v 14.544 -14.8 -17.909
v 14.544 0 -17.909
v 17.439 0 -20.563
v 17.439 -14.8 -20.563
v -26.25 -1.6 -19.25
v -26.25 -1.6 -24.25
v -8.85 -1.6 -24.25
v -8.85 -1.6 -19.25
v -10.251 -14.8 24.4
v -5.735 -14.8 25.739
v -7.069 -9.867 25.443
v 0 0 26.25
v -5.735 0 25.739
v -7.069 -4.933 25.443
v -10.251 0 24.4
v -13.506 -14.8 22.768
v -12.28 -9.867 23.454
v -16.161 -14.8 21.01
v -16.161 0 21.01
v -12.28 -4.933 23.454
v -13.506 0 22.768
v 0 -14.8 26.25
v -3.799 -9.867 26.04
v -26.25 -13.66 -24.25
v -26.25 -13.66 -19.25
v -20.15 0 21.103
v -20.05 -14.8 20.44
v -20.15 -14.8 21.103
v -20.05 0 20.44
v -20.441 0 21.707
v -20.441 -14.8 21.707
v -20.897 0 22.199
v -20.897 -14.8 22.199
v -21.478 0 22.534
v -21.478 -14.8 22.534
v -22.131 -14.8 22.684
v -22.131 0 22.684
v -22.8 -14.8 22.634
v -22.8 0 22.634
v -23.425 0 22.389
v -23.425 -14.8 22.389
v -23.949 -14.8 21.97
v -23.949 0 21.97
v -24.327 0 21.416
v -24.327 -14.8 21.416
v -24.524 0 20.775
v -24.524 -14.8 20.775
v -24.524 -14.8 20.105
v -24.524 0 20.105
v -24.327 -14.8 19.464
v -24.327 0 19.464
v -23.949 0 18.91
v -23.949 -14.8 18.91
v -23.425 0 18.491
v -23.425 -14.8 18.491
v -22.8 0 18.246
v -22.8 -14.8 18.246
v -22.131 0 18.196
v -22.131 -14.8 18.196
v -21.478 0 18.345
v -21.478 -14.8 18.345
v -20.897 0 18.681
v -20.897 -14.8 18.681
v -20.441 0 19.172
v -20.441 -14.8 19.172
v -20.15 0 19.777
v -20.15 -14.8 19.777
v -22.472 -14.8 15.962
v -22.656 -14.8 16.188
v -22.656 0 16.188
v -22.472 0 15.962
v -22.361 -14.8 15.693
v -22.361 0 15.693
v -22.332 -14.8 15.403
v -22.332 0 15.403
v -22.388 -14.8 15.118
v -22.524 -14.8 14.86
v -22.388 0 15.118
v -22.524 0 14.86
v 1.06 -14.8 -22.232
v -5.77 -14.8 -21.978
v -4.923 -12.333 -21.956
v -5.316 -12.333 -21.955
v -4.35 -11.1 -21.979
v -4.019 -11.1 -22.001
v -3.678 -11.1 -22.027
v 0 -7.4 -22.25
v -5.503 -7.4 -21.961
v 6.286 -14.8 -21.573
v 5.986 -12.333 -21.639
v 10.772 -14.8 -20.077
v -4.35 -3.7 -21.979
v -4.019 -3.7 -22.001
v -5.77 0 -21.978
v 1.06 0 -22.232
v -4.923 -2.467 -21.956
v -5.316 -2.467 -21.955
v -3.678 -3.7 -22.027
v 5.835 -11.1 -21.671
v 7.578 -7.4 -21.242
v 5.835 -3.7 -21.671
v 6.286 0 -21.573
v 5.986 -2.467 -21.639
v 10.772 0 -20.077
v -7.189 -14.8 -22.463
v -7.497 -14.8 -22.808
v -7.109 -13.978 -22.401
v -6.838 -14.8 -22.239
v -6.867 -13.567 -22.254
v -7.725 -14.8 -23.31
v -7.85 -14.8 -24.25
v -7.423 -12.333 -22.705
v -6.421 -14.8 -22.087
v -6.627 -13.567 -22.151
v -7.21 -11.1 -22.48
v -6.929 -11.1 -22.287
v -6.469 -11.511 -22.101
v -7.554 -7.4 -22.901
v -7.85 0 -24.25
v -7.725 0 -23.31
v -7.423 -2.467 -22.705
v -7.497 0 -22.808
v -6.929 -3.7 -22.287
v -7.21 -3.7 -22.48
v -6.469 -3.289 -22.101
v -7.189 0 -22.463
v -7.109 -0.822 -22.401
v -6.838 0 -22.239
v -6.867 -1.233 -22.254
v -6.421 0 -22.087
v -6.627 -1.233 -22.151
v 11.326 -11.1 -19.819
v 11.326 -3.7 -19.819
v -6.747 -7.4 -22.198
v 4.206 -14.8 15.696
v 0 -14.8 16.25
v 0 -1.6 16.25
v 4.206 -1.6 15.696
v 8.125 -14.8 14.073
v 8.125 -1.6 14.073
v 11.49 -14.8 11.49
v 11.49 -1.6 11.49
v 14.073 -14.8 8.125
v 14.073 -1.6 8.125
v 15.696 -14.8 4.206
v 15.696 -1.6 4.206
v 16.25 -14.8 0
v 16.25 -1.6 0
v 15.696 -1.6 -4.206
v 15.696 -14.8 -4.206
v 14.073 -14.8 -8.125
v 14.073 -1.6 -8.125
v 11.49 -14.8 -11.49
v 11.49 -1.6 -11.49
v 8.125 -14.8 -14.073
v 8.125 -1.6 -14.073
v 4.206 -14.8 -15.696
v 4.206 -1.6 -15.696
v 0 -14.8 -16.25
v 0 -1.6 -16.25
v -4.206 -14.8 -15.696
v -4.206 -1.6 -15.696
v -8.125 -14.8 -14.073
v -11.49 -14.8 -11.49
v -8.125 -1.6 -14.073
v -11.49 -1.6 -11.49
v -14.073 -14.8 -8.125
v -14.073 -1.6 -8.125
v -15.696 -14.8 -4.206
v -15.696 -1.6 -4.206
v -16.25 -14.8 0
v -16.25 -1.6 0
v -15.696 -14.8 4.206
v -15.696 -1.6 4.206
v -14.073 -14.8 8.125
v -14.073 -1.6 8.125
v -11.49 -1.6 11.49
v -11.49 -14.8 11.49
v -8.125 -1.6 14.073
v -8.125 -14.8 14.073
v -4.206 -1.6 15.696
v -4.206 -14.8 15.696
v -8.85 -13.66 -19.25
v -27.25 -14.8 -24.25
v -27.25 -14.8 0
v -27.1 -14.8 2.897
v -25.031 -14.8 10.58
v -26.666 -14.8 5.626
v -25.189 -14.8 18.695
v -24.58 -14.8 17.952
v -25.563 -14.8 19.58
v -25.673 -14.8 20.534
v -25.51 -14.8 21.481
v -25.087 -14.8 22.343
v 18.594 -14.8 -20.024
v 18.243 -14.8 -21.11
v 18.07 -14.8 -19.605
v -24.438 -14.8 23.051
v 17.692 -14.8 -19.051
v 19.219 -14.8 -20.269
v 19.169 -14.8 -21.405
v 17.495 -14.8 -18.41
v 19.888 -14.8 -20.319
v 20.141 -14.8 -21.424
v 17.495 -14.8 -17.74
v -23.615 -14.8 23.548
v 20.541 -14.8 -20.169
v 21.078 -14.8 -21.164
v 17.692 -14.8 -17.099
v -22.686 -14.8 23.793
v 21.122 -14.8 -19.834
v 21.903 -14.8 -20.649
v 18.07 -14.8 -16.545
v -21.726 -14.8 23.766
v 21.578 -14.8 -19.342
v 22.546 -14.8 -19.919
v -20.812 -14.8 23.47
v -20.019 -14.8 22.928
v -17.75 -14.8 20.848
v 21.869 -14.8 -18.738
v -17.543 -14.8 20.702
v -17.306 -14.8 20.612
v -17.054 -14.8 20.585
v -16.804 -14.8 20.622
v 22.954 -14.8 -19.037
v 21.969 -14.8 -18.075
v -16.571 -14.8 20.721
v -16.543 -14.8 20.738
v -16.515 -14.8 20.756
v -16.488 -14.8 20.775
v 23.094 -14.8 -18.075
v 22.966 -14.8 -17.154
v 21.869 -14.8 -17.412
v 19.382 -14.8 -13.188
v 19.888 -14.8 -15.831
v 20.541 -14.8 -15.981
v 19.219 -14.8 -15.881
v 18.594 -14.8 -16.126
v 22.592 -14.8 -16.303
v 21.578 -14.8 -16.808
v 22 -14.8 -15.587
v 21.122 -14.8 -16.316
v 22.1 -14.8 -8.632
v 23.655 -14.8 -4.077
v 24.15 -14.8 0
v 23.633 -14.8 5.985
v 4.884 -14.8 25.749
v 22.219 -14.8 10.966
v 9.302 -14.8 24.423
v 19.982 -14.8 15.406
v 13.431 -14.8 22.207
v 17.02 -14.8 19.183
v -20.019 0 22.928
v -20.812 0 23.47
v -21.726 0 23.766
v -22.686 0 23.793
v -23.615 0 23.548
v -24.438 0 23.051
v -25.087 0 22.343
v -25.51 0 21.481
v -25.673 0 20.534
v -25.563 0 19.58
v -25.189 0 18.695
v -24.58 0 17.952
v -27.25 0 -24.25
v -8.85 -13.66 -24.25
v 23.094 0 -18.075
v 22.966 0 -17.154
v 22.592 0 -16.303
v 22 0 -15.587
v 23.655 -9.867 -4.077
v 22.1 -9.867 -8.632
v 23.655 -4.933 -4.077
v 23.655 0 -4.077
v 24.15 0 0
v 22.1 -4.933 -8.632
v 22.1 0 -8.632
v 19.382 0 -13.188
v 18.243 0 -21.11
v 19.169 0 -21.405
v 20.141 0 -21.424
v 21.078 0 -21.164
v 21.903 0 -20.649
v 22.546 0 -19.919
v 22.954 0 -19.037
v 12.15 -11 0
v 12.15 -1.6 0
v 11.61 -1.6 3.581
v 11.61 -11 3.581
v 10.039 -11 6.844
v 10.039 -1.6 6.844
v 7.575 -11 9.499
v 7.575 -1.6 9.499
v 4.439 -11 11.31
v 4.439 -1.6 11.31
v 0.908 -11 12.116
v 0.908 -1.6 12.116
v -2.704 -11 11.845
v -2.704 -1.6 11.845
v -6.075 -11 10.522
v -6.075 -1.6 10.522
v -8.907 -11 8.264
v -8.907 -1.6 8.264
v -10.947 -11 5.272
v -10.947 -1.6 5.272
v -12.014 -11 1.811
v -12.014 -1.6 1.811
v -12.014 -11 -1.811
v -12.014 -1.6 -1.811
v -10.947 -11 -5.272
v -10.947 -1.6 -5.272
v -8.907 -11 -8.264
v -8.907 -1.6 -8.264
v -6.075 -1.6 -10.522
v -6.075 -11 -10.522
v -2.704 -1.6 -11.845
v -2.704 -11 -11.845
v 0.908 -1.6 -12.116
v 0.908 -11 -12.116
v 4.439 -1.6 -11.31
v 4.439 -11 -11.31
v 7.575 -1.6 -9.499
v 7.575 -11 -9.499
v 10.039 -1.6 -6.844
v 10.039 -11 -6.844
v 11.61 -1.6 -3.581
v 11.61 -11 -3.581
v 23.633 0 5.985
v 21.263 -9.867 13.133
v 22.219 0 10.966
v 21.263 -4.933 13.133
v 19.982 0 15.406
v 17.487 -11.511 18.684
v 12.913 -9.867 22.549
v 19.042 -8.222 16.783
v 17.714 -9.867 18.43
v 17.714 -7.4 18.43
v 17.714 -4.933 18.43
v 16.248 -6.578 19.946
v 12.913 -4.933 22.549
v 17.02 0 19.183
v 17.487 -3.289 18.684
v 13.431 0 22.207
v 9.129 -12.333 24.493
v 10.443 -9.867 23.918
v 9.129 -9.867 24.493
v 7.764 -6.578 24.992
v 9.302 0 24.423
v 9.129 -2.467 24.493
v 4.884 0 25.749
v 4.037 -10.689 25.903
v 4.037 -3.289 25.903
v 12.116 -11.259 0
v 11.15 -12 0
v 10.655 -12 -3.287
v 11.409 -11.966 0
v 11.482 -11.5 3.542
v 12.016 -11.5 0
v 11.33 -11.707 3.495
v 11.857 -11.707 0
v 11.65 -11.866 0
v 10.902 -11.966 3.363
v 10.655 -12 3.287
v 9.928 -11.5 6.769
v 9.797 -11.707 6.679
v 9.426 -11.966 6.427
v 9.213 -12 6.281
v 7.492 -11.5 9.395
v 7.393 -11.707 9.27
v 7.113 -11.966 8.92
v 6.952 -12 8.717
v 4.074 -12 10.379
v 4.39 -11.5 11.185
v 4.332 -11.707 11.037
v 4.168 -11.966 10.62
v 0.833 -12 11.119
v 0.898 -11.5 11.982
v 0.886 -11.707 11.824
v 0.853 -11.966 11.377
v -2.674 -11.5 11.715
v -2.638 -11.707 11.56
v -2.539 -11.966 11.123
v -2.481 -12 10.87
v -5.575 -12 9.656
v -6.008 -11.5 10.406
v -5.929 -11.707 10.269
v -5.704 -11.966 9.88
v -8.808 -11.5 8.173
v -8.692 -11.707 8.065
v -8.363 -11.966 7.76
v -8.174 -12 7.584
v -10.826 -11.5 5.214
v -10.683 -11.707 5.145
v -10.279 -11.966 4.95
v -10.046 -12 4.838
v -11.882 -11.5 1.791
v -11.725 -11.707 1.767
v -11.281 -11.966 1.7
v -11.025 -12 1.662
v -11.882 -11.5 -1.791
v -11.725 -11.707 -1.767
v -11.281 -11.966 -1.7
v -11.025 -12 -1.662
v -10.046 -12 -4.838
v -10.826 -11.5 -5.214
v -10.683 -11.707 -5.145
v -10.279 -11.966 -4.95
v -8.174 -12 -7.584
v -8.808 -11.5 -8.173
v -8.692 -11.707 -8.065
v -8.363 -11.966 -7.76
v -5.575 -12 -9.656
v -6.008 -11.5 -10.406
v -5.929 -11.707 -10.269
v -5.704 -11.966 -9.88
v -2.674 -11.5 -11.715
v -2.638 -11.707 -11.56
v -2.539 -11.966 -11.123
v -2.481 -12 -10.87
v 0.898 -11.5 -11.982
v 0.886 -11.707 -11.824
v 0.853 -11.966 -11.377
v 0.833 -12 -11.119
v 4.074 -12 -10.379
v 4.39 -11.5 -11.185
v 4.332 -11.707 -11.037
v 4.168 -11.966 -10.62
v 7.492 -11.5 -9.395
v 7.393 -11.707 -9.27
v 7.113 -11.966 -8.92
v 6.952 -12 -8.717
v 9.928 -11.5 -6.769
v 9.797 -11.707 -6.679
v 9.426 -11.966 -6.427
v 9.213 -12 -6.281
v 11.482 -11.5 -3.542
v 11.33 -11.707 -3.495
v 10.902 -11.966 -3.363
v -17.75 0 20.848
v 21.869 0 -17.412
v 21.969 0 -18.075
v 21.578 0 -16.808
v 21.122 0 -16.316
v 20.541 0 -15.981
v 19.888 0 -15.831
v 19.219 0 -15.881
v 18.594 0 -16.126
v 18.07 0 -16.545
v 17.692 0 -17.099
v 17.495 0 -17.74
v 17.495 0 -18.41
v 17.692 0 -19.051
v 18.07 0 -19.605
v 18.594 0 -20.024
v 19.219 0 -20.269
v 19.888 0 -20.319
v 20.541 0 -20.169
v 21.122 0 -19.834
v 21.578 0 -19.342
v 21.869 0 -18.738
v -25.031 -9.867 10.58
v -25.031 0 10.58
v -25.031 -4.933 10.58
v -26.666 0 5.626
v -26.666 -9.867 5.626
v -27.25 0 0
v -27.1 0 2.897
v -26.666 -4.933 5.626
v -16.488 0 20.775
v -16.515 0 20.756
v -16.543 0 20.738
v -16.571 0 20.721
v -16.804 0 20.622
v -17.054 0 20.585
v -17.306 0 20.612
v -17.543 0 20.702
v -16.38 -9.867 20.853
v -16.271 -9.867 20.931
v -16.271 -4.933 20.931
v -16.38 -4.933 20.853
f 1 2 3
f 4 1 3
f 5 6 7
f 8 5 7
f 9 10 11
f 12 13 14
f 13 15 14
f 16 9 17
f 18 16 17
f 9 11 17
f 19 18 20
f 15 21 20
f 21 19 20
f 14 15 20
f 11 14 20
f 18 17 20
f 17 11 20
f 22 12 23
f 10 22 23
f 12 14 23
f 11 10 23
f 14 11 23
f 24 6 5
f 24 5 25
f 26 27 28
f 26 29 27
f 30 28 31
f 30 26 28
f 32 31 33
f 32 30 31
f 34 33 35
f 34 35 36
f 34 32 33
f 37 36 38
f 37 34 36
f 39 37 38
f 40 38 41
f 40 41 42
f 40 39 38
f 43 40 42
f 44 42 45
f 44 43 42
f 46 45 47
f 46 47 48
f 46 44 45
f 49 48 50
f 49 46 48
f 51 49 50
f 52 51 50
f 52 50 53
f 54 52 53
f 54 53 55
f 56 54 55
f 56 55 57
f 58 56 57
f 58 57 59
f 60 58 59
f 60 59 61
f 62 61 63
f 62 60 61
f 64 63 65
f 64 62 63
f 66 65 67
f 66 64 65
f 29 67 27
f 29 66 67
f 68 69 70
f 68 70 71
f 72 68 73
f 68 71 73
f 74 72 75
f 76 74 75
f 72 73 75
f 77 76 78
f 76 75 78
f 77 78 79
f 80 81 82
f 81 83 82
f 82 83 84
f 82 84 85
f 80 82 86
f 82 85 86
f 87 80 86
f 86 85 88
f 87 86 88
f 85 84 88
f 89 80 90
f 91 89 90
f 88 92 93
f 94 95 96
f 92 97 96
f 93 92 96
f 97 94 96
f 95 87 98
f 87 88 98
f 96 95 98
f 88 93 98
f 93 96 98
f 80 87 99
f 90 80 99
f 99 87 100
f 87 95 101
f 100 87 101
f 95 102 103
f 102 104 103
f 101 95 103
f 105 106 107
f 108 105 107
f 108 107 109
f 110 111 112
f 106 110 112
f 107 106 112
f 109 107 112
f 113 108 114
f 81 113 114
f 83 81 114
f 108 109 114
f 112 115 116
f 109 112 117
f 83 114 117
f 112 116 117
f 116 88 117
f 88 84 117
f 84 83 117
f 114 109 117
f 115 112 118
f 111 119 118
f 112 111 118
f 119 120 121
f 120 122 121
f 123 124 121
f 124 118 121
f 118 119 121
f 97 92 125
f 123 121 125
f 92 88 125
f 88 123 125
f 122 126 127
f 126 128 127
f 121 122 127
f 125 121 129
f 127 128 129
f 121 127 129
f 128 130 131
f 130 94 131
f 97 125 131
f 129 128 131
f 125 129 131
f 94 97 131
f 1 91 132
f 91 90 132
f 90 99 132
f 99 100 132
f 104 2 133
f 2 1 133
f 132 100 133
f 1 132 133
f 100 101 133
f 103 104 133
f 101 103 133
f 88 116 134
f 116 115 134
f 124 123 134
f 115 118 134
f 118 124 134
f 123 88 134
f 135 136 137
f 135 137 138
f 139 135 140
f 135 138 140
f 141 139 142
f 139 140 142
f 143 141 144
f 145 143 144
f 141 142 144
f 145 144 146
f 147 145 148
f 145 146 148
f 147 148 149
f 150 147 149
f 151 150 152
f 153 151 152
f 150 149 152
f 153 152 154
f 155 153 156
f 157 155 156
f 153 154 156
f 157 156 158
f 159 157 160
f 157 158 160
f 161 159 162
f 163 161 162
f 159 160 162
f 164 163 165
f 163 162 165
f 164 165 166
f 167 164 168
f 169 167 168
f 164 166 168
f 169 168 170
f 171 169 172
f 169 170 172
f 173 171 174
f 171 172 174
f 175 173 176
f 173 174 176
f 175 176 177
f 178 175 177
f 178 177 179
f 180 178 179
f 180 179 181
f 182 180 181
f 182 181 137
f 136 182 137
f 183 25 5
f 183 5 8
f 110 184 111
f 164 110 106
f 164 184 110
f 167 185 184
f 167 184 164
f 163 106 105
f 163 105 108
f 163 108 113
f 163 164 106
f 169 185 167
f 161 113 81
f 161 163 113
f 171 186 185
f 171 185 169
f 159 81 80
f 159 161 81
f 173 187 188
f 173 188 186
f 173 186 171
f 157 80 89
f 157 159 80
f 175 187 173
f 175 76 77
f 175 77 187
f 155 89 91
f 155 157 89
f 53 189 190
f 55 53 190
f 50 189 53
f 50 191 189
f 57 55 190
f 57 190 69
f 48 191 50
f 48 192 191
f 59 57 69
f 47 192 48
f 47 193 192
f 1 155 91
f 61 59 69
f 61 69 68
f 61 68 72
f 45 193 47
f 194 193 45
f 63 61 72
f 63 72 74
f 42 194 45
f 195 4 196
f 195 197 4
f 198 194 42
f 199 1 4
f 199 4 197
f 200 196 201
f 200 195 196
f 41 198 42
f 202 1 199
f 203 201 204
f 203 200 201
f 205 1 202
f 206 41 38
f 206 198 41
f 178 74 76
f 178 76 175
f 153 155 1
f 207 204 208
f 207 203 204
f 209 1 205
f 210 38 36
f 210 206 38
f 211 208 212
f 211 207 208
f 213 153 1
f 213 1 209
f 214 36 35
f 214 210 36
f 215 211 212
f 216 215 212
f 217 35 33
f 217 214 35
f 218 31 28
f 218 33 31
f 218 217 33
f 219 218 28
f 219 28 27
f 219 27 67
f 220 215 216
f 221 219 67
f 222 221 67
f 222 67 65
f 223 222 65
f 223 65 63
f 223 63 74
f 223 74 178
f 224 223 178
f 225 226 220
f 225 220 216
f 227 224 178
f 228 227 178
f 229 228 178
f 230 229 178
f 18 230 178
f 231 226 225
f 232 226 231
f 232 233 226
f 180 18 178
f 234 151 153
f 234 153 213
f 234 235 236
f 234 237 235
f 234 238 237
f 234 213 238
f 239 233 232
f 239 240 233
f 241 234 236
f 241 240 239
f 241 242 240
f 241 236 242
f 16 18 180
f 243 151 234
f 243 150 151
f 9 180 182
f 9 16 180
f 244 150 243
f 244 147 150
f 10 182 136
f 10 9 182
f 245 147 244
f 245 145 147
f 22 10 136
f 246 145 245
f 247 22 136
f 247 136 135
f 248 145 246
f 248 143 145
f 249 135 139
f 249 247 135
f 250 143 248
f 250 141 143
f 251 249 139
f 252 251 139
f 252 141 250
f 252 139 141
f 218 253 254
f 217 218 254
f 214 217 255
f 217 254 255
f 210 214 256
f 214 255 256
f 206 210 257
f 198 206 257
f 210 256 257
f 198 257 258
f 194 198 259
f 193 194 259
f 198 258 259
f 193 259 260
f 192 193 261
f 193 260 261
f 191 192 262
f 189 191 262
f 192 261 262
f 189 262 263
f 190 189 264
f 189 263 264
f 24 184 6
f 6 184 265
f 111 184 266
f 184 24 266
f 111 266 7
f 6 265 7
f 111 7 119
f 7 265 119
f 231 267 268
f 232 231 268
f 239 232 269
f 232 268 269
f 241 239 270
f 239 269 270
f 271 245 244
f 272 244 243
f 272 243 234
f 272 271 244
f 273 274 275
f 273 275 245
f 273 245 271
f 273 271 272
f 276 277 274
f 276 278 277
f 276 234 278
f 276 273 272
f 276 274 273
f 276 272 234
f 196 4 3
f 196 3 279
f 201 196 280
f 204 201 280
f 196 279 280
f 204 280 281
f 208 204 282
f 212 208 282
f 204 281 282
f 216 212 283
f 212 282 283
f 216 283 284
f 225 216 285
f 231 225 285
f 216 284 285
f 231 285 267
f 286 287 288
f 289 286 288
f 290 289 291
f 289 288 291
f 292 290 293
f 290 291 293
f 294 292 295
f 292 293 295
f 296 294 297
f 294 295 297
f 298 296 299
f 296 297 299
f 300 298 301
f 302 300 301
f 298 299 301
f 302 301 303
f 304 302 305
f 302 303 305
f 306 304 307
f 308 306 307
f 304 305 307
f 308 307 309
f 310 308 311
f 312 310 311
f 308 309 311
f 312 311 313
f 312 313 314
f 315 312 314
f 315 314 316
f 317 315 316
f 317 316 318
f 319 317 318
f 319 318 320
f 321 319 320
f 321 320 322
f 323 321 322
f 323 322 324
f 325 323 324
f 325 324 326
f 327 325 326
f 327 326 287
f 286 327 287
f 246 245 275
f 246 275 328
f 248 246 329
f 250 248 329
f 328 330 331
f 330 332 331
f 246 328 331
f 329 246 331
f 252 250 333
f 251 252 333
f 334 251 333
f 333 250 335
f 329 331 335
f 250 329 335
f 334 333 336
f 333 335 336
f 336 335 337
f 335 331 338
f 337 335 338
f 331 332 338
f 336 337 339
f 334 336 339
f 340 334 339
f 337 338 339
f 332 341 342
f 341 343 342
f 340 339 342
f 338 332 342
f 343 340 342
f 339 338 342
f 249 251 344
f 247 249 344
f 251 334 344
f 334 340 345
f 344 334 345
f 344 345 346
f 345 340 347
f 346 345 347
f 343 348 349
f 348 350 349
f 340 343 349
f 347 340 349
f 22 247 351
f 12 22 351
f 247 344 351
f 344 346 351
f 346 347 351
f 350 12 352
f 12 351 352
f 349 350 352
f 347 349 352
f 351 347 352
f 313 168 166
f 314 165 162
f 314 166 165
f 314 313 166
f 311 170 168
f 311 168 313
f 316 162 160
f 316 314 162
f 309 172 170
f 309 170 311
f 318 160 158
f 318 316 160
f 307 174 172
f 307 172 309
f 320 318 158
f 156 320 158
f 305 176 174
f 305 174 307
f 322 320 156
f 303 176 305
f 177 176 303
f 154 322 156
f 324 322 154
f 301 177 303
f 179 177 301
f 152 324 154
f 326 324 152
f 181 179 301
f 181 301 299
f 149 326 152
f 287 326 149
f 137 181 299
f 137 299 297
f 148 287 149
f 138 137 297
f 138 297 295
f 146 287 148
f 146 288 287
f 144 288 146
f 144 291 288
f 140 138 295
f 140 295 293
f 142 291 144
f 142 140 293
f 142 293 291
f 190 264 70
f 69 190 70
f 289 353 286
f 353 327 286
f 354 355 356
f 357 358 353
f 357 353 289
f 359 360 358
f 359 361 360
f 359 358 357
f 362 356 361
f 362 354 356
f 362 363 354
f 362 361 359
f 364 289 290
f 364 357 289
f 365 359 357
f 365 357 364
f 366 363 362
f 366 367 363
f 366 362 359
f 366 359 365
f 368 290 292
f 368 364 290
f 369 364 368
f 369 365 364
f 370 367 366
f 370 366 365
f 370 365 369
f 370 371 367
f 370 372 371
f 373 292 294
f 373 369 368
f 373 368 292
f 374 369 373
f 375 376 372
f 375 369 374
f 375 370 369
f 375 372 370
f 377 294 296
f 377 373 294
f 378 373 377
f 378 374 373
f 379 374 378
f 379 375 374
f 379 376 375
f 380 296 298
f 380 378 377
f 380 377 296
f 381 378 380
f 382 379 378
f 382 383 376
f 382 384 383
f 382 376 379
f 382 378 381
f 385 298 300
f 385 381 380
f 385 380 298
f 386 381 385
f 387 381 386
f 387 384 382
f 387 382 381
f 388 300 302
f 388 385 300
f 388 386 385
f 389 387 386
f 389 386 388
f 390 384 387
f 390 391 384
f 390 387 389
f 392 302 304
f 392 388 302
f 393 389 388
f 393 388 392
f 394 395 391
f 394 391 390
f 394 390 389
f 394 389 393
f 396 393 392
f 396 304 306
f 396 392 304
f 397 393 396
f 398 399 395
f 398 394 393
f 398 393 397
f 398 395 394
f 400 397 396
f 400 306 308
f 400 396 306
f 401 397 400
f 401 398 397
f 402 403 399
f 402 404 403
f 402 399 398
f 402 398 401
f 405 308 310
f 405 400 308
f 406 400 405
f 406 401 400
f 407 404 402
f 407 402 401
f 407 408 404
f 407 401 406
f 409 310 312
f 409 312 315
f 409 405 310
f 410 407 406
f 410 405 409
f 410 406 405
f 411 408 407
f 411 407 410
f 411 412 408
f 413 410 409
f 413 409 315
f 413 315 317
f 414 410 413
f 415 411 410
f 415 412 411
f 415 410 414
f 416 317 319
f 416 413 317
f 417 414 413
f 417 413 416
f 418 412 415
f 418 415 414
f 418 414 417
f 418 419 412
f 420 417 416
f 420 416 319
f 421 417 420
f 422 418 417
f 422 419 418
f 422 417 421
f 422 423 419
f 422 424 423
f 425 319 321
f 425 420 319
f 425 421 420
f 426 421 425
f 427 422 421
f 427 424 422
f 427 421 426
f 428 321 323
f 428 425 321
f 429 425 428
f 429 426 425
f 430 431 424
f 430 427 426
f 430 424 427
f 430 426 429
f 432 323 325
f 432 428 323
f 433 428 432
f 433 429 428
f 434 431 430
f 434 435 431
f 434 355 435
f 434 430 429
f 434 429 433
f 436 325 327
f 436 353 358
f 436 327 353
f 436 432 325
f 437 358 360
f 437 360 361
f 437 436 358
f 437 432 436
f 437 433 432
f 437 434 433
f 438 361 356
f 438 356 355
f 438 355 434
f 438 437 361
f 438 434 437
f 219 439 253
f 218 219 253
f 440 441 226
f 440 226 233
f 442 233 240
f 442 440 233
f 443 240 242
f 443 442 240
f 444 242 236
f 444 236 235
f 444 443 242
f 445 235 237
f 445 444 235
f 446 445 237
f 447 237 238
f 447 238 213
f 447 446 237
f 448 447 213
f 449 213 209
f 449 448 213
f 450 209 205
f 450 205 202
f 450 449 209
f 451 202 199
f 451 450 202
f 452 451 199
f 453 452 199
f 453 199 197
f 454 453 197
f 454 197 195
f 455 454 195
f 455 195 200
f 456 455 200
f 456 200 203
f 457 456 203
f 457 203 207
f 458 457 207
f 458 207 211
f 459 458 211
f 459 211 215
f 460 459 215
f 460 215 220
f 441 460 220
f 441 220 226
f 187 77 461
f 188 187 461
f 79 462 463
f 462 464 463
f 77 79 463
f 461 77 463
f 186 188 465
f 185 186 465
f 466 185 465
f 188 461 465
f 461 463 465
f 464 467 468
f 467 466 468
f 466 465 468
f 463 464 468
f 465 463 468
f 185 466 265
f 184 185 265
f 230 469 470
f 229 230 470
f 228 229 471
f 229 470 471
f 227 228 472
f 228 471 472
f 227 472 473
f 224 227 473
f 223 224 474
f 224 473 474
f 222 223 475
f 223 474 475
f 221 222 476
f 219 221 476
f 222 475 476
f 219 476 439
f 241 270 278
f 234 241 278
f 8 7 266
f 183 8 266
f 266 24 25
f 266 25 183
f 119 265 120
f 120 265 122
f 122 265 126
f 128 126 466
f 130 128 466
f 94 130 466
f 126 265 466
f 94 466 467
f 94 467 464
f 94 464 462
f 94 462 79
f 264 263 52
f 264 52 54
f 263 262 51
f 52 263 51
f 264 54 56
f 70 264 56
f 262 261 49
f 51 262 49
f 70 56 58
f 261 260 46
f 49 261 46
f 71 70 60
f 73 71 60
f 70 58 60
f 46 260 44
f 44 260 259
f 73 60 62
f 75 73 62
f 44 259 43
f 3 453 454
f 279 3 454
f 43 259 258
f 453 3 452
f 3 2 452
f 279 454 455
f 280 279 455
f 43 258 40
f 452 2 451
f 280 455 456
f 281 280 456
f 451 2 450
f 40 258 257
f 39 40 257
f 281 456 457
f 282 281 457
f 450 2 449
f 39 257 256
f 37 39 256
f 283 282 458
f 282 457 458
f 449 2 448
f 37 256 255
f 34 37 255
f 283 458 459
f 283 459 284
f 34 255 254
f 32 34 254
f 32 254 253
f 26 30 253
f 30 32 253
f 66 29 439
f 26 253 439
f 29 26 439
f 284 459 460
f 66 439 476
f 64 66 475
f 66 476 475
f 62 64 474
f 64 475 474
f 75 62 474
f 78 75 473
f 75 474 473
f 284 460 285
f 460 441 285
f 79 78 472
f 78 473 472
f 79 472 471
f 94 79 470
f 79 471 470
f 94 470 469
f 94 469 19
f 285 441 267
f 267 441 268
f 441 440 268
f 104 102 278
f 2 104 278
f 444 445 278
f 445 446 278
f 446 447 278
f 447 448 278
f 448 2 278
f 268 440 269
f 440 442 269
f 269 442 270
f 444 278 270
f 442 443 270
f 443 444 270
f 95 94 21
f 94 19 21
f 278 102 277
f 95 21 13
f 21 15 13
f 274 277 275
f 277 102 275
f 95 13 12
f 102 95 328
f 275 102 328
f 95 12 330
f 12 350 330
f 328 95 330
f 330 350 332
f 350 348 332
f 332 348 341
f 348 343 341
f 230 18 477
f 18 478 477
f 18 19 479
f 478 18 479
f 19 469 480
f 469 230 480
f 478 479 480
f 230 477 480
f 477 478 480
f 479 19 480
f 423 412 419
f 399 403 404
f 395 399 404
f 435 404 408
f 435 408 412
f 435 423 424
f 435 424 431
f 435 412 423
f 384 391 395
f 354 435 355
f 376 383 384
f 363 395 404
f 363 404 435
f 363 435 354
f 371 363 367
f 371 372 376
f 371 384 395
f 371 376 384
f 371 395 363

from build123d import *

# Parameters (mm, degrees)
F0_R     = 2.25
F1_DEPTH = 14.8
F0_R_2   = 12.15
F2_DEPTH = 1.6
F3_DEPTH = 12
F4_R     = 1
F5_W     = 17.4
F5_H     = 12.06
F6_DEPTH = 5


with BuildPart() as f1:
    # F0 (on Front) → F1 (new body)
    with BuildSketch(Plane.XZ):
        with BuildLine():
            Line((-27.25, 0), (-27.25, -24.25))
            Line((-27.25, -24.25), (-7.85, -24.25))
            add(Edge.make_bspline(
                [(-7.85, -24.25), (-7.8176427633, -20.8169110119), (-4.3375464156, -22.25), (0, -22.25)],
                knots=[0, 0, 0, 0, 8.1007715682, 8.1007715682, 8.1007715682, 8.1007715682], degree=3))
            add(Edge.make_bspline(
                [(14.5437740109, -17.909216005), (10.9068056005, -20.5097986935), (6.122203429, -22.25), (0, -22.25)],
                knots=[21.4185998801, 21.4185998801, 21.4185998801, 21.4185998801, 32.8372501894, 32.8372501894, 32.8372501894, 32.8372501894], degree=3))
            add(Edge.make_bspline(
                [(19.3821703567, -13.1875596661), (18.0720576154, -14.9154903789), (16.4686462302, -16.5328528348), (14.5437740109, -17.909216005)],
                knots=[15.3752582058, 15.3752582058, 15.3752582058, 15.3752582058, 21.4185998801, 21.4185998801, 21.4185998801, 21.4185998801], degree=3))
            add(Edge.make_bspline(
                [(24.15, 0), (24.15, -3.6795945823), (22.7153133033, -8.7914188713), (19.3821703567, -13.1875596661)],
                knots=[0, 0, 0, 0, 15.3752582058, 15.3752582058, 15.3752582058, 15.3752582058], degree=3))
            add(Edge.make_bspline(
                [(24.15, 0), (24.2929216474, 14.3250608817), (14.8955499753, 26.0717794299), (0, 26.25)],
                knots=[0, 0, 0, 0, 35.6691042781, 35.6691042781, 35.6691042781, 35.6691042781], degree=3))
            add(Edge.make_bspline(
                [(0, 26.25), (-5.135877891, 26.2629323961), (-11.114542158, 24.5071482084), (-16.161044046, 21.0100500089)],
                knots=[0, 0, 0, 0, 16.8847295513, 16.8847295513, 16.8847295513, 16.8847295513], degree=3))
            add(Edge.make_bspline(
                [(-16.161044046, 21.0100500089), (-16.2712231538, 20.9311478534), (-16.3801314978, 20.8526765927), (-16.487850408, 20.7747483814)],
                knots=[16.497992714, 16.497992714, 16.497992714, 16.497992714, 17.0339105302, 17.0339105302, 17.0339105302, 17.0339105302], degree=3))
            add(Edge.make_bspline(
                [(-16.487850408, 20.7747483814), (-16.7124834128, 20.6122397909), (-16.9319438817, 20.4520927797), (-17.1469693705, 20.2953244431)],
                knots=[17.0339105302, 17.0339105302, 17.0339105302, 17.0339105302, 18.1514935909, 18.1514935909, 18.1514935909, 18.1514935909], degree=3))
            add(Edge.make_bspline(
                [(-17.1469693705, 20.2953244431), (-19.1547308604, 18.7732329399), (-20.9874640515, 16.9609662016), (-22.5242380569, 14.8603912213)],
                knots=[17.9984458903, 17.9984458903, 17.9984458903, 17.9984458903, 24.8946681266, 24.8946681266, 24.8946681266, 24.8946681266], degree=3))
            add(Edge.make_bspline(
                [(-22.5242380569, 14.8603912213), (-25.4083045723, 10.9182384112), (-27.25, 5.9606612107), (-27.25, 0)],
                knots=[24.8946681266, 24.8946681266, 24.8946681266, 24.8946681266, 37.836820691, 37.836820691, 37.836820691, 37.836820691], degree=3))
        make_face()
        with BuildLine():
            ThreePointArc((16.25, 0), (-11.4904851943, -11.4904851943), (0, 16.25))
            ThreePointArc((0, 16.25), (11.4904851943, 11.4904851943), (16.25, 0))
        make_face(mode=Mode.SUBTRACT)
        with BuildLine():
            ThreePointArc((-22.6556099396, 16.1880189983), (-22.3361709954, 15.5493145647), (-22.5242380569, 14.8603912213))
            add(Edge.make_bspline(
                [(-17.1469693705, 20.2953244431), (-19.1547308604, 18.7732329399), (-20.9874640515, 16.9609662016), (-22.5242380569, 14.8603912213)],
                knots=[17.9984458903, 17.9984458903, 17.9984458903, 17.9984458903, 24.8946681266, 24.8946681266, 24.8946681266, 24.8946681266], degree=3))
            add(Edge.make_bspline(
                [(-16.5707430692, 20.7208158925), (-16.7643258601, 20.5815997135), (-16.9564357443, 20.4397686985), (-17.1469693705, 20.2953244431)],
                knots=[17.3440044956, 17.3440044956, 17.3440044956, 17.3440044956, 17.9984458903, 17.9984458903, 17.9984458903, 17.9984458903], degree=3))
            ThreePointArc((-16.5707430692, 20.7208158925), (-17.1810656026, 20.5907080667), (-17.7496903525, 20.8477830266))
            Line((-17.7496903525, 20.8477830266), (-20.0190790788, 22.927921795))
            ThreePointArc((-20.0190790788, 22.927921795), (-19.2102914227, 21.7989913577), (-18.924569733, 20.439953271))
            ThreePointArc((-18.924569733, 20.439953271), (-20.9405316464, 17.3506749607), (-24.5800603872, 17.9519847471))
            Line((-24.5800603872, 17.9519847471), (-22.6556099396, 16.1880189983))
        make_face()
        with BuildLine():
            add(Edge.make_bspline(
                [(19.3821703567, -13.1875596661), (18.0720576154, -14.9154903789), (16.4686462302, -16.5328528348), (14.5437740109, -17.909216005)],
                knots=[15.3752582058, 15.3752582058, 15.3752582058, 15.3752582058, 21.4185998801, 21.4185998801, 21.4185998801, 21.4185998801], degree=3))
            Line((14.5437740109, -17.909216005), (17.4389635725, -20.5629685239))
            ThreePointArc((17.4389635725, -20.5629685239), (17.2314857028, -15.7945093458), (21.9999448809, -15.5870314761))
            Line((21.9999448809, -15.5870314761), (19.3821703567, -13.1875596661))
        make_face()
        with BuildLine():
            add(Edge.make_bspline(
                [(-16.5707430692, 20.7208158925), (-16.7643258601, 20.5815997135), (-16.9564357443, 20.4397686985), (-17.1469693705, 20.2953244431)],
                knots=[17.3440044956, 17.3440044956, 17.3440044956, 17.3440044956, 17.9984458903, 17.9984458903, 17.9984458903, 17.9984458903], degree=3))
            add(Edge.make_bspline(
                [(-16.487850408, 20.7747483814), (-16.7124834128, 20.6122397909), (-16.9319438817, 20.4520927797), (-17.1469693705, 20.2953244431)],
                knots=[17.0339105302, 17.0339105302, 17.0339105302, 17.0339105302, 18.1514935909, 18.1514935909, 18.1514935909, 18.1514935909], degree=3))
            ThreePointArc((-16.487850408, 20.7747483814), (-16.5286296346, 20.7467568176), (-16.5707430692, 20.7208158925))
        make_face()
        with BuildLine():
            ThreePointArc((21.9999448809, -15.5870314761), (17.2314857028, -15.7945093458), (17.4389635725, -20.5629685239))
            ThreePointArc((17.4389635725, -20.5629685239), (21.0784923134, -21.1642783104), (23.0944542267, -18.075))
            ThreePointArc((23.0944542267, -18.075), (22.8087325371, -16.7159619133), (21.9999448809, -15.5870314761))
        make_face()
        with Locations((19.7194542267, -18.075)):
            Circle(F0_R, mode=Mode.SUBTRACT)
        with BuildLine():
            ThreePointArc((-20.0190790788, 22.927921795), (-24.787538257, 22.7204439252), (-24.5800603872, 17.9519847471))
            ThreePointArc((-24.5800603872, 17.9519847471), (-20.9405316464, 17.3506749607), (-18.924569733, 20.439953271))
            ThreePointArc((-18.924569733, 20.439953271), (-19.2102914227, 21.7989913577), (-20.0190790788, 22.927921795))
        make_face()
        with Locations((-22.299569733, 20.439953271)):
            Circle(F0_R, mode=Mode.SUBTRACT)
        with BuildLine():
            add(Edge.make_bspline(
                [(0, 26.25), (-8.1731251983, 26.2763401513), (-12.7692289915, 23.4390179358), (-16.161044046, 21.0100500089)],
                knots=[0, 0, 0, 0, 16.497992714, 16.497992714, 16.497992714, 16.497992714], degree=3))
            add(Edge.make_bspline(
                [(0, 26.25), (-5.135877891, 26.2629323961), (-11.114542158, 24.5071482084), (-16.161044046, 21.0100500089)],
                knots=[0, 0, 0, 0, 16.8847295513, 16.8847295513, 16.8847295513, 16.8847295513], degree=3))
        make_face()
    extrude(amount=F1_DEPTH)

    # F0 (on Front) → F2 (join)
    with BuildSketch(Plane.XZ):
        with BuildLine():
            Line((-27.25, 0), (-27.25, -24.25))
            Line((-27.25, -24.25), (-7.85, -24.25))
            add(Edge.make_bspline(
                [(-7.85, -24.25), (-7.8176427633, -20.8169110119), (-4.3375464156, -22.25), (0, -22.25)],
                knots=[0, 0, 0, 0, 8.1007715682, 8.1007715682, 8.1007715682, 8.1007715682], degree=3))
            add(Edge.make_bspline(
                [(14.5437740109, -17.909216005), (10.9068056005, -20.5097986935), (6.122203429, -22.25), (0, -22.25)],
                knots=[21.4185998801, 21.4185998801, 21.4185998801, 21.4185998801, 32.8372501894, 32.8372501894, 32.8372501894, 32.8372501894], degree=3))
            add(Edge.make_bspline(
                [(19.3821703567, -13.1875596661), (18.0720576154, -14.9154903789), (16.4686462302, -16.5328528348), (14.5437740109, -17.909216005)],
                knots=[15.3752582058, 15.3752582058, 15.3752582058, 15.3752582058, 21.4185998801, 21.4185998801, 21.4185998801, 21.4185998801], degree=3))
            add(Edge.make_bspline(
                [(24.15, 0), (24.15, -3.6795945823), (22.7153133033, -8.7914188713), (19.3821703567, -13.1875596661)],
                knots=[0, 0, 0, 0, 15.3752582058, 15.3752582058, 15.3752582058, 15.3752582058], degree=3))
            add(Edge.make_bspline(
                [(24.15, 0), (24.2929216474, 14.3250608817), (14.8955499753, 26.0717794299), (0, 26.25)],
                knots=[0, 0, 0, 0, 35.6691042781, 35.6691042781, 35.6691042781, 35.6691042781], degree=3))
            add(Edge.make_bspline(
                [(0, 26.25), (-5.135877891, 26.2629323961), (-11.114542158, 24.5071482084), (-16.161044046, 21.0100500089)],
                knots=[0, 0, 0, 0, 16.8847295513, 16.8847295513, 16.8847295513, 16.8847295513], degree=3))
            add(Edge.make_bspline(
                [(-16.161044046, 21.0100500089), (-16.2712231538, 20.9311478534), (-16.3801314978, 20.8526765927), (-16.487850408, 20.7747483814)],
                knots=[16.497992714, 16.497992714, 16.497992714, 16.497992714, 17.0339105302, 17.0339105302, 17.0339105302, 17.0339105302], degree=3))
            add(Edge.make_bspline(
                [(-16.487850408, 20.7747483814), (-16.7124834128, 20.6122397909), (-16.9319438817, 20.4520927797), (-17.1469693705, 20.2953244431)],
                knots=[17.0339105302, 17.0339105302, 17.0339105302, 17.0339105302, 18.1514935909, 18.1514935909, 18.1514935909, 18.1514935909], degree=3))
            add(Edge.make_bspline(
                [(-17.1469693705, 20.2953244431), (-19.1547308604, 18.7732329399), (-20.9874640515, 16.9609662016), (-22.5242380569, 14.8603912213)],
                knots=[17.9984458903, 17.9984458903, 17.9984458903, 17.9984458903, 24.8946681266, 24.8946681266, 24.8946681266, 24.8946681266], degree=3))
            add(Edge.make_bspline(
                [(-22.5242380569, 14.8603912213), (-25.4083045723, 10.9182384112), (-27.25, 5.9606612107), (-27.25, 0)],
                knots=[24.8946681266, 24.8946681266, 24.8946681266, 24.8946681266, 37.836820691, 37.836820691, 37.836820691, 37.836820691], degree=3))
        make_face()
        with BuildLine():
            ThreePointArc((16.25, 0), (-11.4904851943, -11.4904851943), (0, 16.25))
            ThreePointArc((0, 16.25), (11.4904851943, 11.4904851943), (16.25, 0))
        make_face(mode=Mode.SUBTRACT)
        with BuildLine():
            ThreePointArc((16.25, 0), (11.4904851943, 11.4904851943), (0, 16.25))
            ThreePointArc((0, 16.25), (-11.4904851943, -11.4904851943), (16.25, 0))
        make_face()
        Circle(F0_R_2, mode=Mode.SUBTRACT)
        Circle(F0_R_2)
        with BuildLine():
            ThreePointArc((-20.0190790788, 22.927921795), (-24.787538257, 22.7204439252), (-24.5800603872, 17.9519847471))
            ThreePointArc((-24.5800603872, 17.9519847471), (-20.9405316464, 17.3506749607), (-18.924569733, 20.439953271))
            ThreePointArc((-18.924569733, 20.439953271), (-19.2102914227, 21.7989913577), (-20.0190790788, 22.927921795))
        make_face()
        with Locations((-22.299569733, 20.439953271)):
            Circle(F0_R, mode=Mode.SUBTRACT)
        with BuildLine():
            ThreePointArc((21.9999448809, -15.5870314761), (17.2314857028, -15.7945093458), (17.4389635725, -20.5629685239))
            ThreePointArc((17.4389635725, -20.5629685239), (21.0784923134, -21.1642783104), (23.0944542267, -18.075))
            ThreePointArc((23.0944542267, -18.075), (22.8087325371, -16.7159619133), (21.9999448809, -15.5870314761))
        make_face()
        with Locations((19.7194542267, -18.075)):
            Circle(F0_R, mode=Mode.SUBTRACT)
        with BuildLine():
            add(Edge.make_bspline(
                [(19.3821703567, -13.1875596661), (18.0720576154, -14.9154903789), (16.4686462302, -16.5328528348), (14.5437740109, -17.909216005)],
                knots=[15.3752582058, 15.3752582058, 15.3752582058, 15.3752582058, 21.4185998801, 21.4185998801, 21.4185998801, 21.4185998801], degree=3))
            Line((14.5437740109, -17.909216005), (17.4389635725, -20.5629685239))
            ThreePointArc((17.4389635725, -20.5629685239), (17.2314857028, -15.7945093458), (21.9999448809, -15.5870314761))
            Line((21.9999448809, -15.5870314761), (19.3821703567, -13.1875596661))
        make_face()
    extrude(amount=F2_DEPTH)

    # F0 (on Front) → F3 (join)
    with BuildSketch(Plane.XZ):
        Circle(F0_R_2)
    extrude(amount=F3_DEPTH)

    # F4
    f4_edges = [f1.edges().sort_by_distance(p)[0] for p in [
        (-12.15, -12, 0),
    ]]
    fillet(f4_edges, radius=F4_R)

    # F5 (on face) → F6 (cut)
    with BuildSketch(Plane(origin=(0, 0, -24.25), x_dir=(1, 0, 0), z_dir=(0, 0, -1))):
        with Locations((-17.55, 7.63)):
            Rectangle(F5_W, F5_H)
    extrude(amount=-F6_DEPTH, mode=Mode.SUBTRACT)


solid = f1.part
